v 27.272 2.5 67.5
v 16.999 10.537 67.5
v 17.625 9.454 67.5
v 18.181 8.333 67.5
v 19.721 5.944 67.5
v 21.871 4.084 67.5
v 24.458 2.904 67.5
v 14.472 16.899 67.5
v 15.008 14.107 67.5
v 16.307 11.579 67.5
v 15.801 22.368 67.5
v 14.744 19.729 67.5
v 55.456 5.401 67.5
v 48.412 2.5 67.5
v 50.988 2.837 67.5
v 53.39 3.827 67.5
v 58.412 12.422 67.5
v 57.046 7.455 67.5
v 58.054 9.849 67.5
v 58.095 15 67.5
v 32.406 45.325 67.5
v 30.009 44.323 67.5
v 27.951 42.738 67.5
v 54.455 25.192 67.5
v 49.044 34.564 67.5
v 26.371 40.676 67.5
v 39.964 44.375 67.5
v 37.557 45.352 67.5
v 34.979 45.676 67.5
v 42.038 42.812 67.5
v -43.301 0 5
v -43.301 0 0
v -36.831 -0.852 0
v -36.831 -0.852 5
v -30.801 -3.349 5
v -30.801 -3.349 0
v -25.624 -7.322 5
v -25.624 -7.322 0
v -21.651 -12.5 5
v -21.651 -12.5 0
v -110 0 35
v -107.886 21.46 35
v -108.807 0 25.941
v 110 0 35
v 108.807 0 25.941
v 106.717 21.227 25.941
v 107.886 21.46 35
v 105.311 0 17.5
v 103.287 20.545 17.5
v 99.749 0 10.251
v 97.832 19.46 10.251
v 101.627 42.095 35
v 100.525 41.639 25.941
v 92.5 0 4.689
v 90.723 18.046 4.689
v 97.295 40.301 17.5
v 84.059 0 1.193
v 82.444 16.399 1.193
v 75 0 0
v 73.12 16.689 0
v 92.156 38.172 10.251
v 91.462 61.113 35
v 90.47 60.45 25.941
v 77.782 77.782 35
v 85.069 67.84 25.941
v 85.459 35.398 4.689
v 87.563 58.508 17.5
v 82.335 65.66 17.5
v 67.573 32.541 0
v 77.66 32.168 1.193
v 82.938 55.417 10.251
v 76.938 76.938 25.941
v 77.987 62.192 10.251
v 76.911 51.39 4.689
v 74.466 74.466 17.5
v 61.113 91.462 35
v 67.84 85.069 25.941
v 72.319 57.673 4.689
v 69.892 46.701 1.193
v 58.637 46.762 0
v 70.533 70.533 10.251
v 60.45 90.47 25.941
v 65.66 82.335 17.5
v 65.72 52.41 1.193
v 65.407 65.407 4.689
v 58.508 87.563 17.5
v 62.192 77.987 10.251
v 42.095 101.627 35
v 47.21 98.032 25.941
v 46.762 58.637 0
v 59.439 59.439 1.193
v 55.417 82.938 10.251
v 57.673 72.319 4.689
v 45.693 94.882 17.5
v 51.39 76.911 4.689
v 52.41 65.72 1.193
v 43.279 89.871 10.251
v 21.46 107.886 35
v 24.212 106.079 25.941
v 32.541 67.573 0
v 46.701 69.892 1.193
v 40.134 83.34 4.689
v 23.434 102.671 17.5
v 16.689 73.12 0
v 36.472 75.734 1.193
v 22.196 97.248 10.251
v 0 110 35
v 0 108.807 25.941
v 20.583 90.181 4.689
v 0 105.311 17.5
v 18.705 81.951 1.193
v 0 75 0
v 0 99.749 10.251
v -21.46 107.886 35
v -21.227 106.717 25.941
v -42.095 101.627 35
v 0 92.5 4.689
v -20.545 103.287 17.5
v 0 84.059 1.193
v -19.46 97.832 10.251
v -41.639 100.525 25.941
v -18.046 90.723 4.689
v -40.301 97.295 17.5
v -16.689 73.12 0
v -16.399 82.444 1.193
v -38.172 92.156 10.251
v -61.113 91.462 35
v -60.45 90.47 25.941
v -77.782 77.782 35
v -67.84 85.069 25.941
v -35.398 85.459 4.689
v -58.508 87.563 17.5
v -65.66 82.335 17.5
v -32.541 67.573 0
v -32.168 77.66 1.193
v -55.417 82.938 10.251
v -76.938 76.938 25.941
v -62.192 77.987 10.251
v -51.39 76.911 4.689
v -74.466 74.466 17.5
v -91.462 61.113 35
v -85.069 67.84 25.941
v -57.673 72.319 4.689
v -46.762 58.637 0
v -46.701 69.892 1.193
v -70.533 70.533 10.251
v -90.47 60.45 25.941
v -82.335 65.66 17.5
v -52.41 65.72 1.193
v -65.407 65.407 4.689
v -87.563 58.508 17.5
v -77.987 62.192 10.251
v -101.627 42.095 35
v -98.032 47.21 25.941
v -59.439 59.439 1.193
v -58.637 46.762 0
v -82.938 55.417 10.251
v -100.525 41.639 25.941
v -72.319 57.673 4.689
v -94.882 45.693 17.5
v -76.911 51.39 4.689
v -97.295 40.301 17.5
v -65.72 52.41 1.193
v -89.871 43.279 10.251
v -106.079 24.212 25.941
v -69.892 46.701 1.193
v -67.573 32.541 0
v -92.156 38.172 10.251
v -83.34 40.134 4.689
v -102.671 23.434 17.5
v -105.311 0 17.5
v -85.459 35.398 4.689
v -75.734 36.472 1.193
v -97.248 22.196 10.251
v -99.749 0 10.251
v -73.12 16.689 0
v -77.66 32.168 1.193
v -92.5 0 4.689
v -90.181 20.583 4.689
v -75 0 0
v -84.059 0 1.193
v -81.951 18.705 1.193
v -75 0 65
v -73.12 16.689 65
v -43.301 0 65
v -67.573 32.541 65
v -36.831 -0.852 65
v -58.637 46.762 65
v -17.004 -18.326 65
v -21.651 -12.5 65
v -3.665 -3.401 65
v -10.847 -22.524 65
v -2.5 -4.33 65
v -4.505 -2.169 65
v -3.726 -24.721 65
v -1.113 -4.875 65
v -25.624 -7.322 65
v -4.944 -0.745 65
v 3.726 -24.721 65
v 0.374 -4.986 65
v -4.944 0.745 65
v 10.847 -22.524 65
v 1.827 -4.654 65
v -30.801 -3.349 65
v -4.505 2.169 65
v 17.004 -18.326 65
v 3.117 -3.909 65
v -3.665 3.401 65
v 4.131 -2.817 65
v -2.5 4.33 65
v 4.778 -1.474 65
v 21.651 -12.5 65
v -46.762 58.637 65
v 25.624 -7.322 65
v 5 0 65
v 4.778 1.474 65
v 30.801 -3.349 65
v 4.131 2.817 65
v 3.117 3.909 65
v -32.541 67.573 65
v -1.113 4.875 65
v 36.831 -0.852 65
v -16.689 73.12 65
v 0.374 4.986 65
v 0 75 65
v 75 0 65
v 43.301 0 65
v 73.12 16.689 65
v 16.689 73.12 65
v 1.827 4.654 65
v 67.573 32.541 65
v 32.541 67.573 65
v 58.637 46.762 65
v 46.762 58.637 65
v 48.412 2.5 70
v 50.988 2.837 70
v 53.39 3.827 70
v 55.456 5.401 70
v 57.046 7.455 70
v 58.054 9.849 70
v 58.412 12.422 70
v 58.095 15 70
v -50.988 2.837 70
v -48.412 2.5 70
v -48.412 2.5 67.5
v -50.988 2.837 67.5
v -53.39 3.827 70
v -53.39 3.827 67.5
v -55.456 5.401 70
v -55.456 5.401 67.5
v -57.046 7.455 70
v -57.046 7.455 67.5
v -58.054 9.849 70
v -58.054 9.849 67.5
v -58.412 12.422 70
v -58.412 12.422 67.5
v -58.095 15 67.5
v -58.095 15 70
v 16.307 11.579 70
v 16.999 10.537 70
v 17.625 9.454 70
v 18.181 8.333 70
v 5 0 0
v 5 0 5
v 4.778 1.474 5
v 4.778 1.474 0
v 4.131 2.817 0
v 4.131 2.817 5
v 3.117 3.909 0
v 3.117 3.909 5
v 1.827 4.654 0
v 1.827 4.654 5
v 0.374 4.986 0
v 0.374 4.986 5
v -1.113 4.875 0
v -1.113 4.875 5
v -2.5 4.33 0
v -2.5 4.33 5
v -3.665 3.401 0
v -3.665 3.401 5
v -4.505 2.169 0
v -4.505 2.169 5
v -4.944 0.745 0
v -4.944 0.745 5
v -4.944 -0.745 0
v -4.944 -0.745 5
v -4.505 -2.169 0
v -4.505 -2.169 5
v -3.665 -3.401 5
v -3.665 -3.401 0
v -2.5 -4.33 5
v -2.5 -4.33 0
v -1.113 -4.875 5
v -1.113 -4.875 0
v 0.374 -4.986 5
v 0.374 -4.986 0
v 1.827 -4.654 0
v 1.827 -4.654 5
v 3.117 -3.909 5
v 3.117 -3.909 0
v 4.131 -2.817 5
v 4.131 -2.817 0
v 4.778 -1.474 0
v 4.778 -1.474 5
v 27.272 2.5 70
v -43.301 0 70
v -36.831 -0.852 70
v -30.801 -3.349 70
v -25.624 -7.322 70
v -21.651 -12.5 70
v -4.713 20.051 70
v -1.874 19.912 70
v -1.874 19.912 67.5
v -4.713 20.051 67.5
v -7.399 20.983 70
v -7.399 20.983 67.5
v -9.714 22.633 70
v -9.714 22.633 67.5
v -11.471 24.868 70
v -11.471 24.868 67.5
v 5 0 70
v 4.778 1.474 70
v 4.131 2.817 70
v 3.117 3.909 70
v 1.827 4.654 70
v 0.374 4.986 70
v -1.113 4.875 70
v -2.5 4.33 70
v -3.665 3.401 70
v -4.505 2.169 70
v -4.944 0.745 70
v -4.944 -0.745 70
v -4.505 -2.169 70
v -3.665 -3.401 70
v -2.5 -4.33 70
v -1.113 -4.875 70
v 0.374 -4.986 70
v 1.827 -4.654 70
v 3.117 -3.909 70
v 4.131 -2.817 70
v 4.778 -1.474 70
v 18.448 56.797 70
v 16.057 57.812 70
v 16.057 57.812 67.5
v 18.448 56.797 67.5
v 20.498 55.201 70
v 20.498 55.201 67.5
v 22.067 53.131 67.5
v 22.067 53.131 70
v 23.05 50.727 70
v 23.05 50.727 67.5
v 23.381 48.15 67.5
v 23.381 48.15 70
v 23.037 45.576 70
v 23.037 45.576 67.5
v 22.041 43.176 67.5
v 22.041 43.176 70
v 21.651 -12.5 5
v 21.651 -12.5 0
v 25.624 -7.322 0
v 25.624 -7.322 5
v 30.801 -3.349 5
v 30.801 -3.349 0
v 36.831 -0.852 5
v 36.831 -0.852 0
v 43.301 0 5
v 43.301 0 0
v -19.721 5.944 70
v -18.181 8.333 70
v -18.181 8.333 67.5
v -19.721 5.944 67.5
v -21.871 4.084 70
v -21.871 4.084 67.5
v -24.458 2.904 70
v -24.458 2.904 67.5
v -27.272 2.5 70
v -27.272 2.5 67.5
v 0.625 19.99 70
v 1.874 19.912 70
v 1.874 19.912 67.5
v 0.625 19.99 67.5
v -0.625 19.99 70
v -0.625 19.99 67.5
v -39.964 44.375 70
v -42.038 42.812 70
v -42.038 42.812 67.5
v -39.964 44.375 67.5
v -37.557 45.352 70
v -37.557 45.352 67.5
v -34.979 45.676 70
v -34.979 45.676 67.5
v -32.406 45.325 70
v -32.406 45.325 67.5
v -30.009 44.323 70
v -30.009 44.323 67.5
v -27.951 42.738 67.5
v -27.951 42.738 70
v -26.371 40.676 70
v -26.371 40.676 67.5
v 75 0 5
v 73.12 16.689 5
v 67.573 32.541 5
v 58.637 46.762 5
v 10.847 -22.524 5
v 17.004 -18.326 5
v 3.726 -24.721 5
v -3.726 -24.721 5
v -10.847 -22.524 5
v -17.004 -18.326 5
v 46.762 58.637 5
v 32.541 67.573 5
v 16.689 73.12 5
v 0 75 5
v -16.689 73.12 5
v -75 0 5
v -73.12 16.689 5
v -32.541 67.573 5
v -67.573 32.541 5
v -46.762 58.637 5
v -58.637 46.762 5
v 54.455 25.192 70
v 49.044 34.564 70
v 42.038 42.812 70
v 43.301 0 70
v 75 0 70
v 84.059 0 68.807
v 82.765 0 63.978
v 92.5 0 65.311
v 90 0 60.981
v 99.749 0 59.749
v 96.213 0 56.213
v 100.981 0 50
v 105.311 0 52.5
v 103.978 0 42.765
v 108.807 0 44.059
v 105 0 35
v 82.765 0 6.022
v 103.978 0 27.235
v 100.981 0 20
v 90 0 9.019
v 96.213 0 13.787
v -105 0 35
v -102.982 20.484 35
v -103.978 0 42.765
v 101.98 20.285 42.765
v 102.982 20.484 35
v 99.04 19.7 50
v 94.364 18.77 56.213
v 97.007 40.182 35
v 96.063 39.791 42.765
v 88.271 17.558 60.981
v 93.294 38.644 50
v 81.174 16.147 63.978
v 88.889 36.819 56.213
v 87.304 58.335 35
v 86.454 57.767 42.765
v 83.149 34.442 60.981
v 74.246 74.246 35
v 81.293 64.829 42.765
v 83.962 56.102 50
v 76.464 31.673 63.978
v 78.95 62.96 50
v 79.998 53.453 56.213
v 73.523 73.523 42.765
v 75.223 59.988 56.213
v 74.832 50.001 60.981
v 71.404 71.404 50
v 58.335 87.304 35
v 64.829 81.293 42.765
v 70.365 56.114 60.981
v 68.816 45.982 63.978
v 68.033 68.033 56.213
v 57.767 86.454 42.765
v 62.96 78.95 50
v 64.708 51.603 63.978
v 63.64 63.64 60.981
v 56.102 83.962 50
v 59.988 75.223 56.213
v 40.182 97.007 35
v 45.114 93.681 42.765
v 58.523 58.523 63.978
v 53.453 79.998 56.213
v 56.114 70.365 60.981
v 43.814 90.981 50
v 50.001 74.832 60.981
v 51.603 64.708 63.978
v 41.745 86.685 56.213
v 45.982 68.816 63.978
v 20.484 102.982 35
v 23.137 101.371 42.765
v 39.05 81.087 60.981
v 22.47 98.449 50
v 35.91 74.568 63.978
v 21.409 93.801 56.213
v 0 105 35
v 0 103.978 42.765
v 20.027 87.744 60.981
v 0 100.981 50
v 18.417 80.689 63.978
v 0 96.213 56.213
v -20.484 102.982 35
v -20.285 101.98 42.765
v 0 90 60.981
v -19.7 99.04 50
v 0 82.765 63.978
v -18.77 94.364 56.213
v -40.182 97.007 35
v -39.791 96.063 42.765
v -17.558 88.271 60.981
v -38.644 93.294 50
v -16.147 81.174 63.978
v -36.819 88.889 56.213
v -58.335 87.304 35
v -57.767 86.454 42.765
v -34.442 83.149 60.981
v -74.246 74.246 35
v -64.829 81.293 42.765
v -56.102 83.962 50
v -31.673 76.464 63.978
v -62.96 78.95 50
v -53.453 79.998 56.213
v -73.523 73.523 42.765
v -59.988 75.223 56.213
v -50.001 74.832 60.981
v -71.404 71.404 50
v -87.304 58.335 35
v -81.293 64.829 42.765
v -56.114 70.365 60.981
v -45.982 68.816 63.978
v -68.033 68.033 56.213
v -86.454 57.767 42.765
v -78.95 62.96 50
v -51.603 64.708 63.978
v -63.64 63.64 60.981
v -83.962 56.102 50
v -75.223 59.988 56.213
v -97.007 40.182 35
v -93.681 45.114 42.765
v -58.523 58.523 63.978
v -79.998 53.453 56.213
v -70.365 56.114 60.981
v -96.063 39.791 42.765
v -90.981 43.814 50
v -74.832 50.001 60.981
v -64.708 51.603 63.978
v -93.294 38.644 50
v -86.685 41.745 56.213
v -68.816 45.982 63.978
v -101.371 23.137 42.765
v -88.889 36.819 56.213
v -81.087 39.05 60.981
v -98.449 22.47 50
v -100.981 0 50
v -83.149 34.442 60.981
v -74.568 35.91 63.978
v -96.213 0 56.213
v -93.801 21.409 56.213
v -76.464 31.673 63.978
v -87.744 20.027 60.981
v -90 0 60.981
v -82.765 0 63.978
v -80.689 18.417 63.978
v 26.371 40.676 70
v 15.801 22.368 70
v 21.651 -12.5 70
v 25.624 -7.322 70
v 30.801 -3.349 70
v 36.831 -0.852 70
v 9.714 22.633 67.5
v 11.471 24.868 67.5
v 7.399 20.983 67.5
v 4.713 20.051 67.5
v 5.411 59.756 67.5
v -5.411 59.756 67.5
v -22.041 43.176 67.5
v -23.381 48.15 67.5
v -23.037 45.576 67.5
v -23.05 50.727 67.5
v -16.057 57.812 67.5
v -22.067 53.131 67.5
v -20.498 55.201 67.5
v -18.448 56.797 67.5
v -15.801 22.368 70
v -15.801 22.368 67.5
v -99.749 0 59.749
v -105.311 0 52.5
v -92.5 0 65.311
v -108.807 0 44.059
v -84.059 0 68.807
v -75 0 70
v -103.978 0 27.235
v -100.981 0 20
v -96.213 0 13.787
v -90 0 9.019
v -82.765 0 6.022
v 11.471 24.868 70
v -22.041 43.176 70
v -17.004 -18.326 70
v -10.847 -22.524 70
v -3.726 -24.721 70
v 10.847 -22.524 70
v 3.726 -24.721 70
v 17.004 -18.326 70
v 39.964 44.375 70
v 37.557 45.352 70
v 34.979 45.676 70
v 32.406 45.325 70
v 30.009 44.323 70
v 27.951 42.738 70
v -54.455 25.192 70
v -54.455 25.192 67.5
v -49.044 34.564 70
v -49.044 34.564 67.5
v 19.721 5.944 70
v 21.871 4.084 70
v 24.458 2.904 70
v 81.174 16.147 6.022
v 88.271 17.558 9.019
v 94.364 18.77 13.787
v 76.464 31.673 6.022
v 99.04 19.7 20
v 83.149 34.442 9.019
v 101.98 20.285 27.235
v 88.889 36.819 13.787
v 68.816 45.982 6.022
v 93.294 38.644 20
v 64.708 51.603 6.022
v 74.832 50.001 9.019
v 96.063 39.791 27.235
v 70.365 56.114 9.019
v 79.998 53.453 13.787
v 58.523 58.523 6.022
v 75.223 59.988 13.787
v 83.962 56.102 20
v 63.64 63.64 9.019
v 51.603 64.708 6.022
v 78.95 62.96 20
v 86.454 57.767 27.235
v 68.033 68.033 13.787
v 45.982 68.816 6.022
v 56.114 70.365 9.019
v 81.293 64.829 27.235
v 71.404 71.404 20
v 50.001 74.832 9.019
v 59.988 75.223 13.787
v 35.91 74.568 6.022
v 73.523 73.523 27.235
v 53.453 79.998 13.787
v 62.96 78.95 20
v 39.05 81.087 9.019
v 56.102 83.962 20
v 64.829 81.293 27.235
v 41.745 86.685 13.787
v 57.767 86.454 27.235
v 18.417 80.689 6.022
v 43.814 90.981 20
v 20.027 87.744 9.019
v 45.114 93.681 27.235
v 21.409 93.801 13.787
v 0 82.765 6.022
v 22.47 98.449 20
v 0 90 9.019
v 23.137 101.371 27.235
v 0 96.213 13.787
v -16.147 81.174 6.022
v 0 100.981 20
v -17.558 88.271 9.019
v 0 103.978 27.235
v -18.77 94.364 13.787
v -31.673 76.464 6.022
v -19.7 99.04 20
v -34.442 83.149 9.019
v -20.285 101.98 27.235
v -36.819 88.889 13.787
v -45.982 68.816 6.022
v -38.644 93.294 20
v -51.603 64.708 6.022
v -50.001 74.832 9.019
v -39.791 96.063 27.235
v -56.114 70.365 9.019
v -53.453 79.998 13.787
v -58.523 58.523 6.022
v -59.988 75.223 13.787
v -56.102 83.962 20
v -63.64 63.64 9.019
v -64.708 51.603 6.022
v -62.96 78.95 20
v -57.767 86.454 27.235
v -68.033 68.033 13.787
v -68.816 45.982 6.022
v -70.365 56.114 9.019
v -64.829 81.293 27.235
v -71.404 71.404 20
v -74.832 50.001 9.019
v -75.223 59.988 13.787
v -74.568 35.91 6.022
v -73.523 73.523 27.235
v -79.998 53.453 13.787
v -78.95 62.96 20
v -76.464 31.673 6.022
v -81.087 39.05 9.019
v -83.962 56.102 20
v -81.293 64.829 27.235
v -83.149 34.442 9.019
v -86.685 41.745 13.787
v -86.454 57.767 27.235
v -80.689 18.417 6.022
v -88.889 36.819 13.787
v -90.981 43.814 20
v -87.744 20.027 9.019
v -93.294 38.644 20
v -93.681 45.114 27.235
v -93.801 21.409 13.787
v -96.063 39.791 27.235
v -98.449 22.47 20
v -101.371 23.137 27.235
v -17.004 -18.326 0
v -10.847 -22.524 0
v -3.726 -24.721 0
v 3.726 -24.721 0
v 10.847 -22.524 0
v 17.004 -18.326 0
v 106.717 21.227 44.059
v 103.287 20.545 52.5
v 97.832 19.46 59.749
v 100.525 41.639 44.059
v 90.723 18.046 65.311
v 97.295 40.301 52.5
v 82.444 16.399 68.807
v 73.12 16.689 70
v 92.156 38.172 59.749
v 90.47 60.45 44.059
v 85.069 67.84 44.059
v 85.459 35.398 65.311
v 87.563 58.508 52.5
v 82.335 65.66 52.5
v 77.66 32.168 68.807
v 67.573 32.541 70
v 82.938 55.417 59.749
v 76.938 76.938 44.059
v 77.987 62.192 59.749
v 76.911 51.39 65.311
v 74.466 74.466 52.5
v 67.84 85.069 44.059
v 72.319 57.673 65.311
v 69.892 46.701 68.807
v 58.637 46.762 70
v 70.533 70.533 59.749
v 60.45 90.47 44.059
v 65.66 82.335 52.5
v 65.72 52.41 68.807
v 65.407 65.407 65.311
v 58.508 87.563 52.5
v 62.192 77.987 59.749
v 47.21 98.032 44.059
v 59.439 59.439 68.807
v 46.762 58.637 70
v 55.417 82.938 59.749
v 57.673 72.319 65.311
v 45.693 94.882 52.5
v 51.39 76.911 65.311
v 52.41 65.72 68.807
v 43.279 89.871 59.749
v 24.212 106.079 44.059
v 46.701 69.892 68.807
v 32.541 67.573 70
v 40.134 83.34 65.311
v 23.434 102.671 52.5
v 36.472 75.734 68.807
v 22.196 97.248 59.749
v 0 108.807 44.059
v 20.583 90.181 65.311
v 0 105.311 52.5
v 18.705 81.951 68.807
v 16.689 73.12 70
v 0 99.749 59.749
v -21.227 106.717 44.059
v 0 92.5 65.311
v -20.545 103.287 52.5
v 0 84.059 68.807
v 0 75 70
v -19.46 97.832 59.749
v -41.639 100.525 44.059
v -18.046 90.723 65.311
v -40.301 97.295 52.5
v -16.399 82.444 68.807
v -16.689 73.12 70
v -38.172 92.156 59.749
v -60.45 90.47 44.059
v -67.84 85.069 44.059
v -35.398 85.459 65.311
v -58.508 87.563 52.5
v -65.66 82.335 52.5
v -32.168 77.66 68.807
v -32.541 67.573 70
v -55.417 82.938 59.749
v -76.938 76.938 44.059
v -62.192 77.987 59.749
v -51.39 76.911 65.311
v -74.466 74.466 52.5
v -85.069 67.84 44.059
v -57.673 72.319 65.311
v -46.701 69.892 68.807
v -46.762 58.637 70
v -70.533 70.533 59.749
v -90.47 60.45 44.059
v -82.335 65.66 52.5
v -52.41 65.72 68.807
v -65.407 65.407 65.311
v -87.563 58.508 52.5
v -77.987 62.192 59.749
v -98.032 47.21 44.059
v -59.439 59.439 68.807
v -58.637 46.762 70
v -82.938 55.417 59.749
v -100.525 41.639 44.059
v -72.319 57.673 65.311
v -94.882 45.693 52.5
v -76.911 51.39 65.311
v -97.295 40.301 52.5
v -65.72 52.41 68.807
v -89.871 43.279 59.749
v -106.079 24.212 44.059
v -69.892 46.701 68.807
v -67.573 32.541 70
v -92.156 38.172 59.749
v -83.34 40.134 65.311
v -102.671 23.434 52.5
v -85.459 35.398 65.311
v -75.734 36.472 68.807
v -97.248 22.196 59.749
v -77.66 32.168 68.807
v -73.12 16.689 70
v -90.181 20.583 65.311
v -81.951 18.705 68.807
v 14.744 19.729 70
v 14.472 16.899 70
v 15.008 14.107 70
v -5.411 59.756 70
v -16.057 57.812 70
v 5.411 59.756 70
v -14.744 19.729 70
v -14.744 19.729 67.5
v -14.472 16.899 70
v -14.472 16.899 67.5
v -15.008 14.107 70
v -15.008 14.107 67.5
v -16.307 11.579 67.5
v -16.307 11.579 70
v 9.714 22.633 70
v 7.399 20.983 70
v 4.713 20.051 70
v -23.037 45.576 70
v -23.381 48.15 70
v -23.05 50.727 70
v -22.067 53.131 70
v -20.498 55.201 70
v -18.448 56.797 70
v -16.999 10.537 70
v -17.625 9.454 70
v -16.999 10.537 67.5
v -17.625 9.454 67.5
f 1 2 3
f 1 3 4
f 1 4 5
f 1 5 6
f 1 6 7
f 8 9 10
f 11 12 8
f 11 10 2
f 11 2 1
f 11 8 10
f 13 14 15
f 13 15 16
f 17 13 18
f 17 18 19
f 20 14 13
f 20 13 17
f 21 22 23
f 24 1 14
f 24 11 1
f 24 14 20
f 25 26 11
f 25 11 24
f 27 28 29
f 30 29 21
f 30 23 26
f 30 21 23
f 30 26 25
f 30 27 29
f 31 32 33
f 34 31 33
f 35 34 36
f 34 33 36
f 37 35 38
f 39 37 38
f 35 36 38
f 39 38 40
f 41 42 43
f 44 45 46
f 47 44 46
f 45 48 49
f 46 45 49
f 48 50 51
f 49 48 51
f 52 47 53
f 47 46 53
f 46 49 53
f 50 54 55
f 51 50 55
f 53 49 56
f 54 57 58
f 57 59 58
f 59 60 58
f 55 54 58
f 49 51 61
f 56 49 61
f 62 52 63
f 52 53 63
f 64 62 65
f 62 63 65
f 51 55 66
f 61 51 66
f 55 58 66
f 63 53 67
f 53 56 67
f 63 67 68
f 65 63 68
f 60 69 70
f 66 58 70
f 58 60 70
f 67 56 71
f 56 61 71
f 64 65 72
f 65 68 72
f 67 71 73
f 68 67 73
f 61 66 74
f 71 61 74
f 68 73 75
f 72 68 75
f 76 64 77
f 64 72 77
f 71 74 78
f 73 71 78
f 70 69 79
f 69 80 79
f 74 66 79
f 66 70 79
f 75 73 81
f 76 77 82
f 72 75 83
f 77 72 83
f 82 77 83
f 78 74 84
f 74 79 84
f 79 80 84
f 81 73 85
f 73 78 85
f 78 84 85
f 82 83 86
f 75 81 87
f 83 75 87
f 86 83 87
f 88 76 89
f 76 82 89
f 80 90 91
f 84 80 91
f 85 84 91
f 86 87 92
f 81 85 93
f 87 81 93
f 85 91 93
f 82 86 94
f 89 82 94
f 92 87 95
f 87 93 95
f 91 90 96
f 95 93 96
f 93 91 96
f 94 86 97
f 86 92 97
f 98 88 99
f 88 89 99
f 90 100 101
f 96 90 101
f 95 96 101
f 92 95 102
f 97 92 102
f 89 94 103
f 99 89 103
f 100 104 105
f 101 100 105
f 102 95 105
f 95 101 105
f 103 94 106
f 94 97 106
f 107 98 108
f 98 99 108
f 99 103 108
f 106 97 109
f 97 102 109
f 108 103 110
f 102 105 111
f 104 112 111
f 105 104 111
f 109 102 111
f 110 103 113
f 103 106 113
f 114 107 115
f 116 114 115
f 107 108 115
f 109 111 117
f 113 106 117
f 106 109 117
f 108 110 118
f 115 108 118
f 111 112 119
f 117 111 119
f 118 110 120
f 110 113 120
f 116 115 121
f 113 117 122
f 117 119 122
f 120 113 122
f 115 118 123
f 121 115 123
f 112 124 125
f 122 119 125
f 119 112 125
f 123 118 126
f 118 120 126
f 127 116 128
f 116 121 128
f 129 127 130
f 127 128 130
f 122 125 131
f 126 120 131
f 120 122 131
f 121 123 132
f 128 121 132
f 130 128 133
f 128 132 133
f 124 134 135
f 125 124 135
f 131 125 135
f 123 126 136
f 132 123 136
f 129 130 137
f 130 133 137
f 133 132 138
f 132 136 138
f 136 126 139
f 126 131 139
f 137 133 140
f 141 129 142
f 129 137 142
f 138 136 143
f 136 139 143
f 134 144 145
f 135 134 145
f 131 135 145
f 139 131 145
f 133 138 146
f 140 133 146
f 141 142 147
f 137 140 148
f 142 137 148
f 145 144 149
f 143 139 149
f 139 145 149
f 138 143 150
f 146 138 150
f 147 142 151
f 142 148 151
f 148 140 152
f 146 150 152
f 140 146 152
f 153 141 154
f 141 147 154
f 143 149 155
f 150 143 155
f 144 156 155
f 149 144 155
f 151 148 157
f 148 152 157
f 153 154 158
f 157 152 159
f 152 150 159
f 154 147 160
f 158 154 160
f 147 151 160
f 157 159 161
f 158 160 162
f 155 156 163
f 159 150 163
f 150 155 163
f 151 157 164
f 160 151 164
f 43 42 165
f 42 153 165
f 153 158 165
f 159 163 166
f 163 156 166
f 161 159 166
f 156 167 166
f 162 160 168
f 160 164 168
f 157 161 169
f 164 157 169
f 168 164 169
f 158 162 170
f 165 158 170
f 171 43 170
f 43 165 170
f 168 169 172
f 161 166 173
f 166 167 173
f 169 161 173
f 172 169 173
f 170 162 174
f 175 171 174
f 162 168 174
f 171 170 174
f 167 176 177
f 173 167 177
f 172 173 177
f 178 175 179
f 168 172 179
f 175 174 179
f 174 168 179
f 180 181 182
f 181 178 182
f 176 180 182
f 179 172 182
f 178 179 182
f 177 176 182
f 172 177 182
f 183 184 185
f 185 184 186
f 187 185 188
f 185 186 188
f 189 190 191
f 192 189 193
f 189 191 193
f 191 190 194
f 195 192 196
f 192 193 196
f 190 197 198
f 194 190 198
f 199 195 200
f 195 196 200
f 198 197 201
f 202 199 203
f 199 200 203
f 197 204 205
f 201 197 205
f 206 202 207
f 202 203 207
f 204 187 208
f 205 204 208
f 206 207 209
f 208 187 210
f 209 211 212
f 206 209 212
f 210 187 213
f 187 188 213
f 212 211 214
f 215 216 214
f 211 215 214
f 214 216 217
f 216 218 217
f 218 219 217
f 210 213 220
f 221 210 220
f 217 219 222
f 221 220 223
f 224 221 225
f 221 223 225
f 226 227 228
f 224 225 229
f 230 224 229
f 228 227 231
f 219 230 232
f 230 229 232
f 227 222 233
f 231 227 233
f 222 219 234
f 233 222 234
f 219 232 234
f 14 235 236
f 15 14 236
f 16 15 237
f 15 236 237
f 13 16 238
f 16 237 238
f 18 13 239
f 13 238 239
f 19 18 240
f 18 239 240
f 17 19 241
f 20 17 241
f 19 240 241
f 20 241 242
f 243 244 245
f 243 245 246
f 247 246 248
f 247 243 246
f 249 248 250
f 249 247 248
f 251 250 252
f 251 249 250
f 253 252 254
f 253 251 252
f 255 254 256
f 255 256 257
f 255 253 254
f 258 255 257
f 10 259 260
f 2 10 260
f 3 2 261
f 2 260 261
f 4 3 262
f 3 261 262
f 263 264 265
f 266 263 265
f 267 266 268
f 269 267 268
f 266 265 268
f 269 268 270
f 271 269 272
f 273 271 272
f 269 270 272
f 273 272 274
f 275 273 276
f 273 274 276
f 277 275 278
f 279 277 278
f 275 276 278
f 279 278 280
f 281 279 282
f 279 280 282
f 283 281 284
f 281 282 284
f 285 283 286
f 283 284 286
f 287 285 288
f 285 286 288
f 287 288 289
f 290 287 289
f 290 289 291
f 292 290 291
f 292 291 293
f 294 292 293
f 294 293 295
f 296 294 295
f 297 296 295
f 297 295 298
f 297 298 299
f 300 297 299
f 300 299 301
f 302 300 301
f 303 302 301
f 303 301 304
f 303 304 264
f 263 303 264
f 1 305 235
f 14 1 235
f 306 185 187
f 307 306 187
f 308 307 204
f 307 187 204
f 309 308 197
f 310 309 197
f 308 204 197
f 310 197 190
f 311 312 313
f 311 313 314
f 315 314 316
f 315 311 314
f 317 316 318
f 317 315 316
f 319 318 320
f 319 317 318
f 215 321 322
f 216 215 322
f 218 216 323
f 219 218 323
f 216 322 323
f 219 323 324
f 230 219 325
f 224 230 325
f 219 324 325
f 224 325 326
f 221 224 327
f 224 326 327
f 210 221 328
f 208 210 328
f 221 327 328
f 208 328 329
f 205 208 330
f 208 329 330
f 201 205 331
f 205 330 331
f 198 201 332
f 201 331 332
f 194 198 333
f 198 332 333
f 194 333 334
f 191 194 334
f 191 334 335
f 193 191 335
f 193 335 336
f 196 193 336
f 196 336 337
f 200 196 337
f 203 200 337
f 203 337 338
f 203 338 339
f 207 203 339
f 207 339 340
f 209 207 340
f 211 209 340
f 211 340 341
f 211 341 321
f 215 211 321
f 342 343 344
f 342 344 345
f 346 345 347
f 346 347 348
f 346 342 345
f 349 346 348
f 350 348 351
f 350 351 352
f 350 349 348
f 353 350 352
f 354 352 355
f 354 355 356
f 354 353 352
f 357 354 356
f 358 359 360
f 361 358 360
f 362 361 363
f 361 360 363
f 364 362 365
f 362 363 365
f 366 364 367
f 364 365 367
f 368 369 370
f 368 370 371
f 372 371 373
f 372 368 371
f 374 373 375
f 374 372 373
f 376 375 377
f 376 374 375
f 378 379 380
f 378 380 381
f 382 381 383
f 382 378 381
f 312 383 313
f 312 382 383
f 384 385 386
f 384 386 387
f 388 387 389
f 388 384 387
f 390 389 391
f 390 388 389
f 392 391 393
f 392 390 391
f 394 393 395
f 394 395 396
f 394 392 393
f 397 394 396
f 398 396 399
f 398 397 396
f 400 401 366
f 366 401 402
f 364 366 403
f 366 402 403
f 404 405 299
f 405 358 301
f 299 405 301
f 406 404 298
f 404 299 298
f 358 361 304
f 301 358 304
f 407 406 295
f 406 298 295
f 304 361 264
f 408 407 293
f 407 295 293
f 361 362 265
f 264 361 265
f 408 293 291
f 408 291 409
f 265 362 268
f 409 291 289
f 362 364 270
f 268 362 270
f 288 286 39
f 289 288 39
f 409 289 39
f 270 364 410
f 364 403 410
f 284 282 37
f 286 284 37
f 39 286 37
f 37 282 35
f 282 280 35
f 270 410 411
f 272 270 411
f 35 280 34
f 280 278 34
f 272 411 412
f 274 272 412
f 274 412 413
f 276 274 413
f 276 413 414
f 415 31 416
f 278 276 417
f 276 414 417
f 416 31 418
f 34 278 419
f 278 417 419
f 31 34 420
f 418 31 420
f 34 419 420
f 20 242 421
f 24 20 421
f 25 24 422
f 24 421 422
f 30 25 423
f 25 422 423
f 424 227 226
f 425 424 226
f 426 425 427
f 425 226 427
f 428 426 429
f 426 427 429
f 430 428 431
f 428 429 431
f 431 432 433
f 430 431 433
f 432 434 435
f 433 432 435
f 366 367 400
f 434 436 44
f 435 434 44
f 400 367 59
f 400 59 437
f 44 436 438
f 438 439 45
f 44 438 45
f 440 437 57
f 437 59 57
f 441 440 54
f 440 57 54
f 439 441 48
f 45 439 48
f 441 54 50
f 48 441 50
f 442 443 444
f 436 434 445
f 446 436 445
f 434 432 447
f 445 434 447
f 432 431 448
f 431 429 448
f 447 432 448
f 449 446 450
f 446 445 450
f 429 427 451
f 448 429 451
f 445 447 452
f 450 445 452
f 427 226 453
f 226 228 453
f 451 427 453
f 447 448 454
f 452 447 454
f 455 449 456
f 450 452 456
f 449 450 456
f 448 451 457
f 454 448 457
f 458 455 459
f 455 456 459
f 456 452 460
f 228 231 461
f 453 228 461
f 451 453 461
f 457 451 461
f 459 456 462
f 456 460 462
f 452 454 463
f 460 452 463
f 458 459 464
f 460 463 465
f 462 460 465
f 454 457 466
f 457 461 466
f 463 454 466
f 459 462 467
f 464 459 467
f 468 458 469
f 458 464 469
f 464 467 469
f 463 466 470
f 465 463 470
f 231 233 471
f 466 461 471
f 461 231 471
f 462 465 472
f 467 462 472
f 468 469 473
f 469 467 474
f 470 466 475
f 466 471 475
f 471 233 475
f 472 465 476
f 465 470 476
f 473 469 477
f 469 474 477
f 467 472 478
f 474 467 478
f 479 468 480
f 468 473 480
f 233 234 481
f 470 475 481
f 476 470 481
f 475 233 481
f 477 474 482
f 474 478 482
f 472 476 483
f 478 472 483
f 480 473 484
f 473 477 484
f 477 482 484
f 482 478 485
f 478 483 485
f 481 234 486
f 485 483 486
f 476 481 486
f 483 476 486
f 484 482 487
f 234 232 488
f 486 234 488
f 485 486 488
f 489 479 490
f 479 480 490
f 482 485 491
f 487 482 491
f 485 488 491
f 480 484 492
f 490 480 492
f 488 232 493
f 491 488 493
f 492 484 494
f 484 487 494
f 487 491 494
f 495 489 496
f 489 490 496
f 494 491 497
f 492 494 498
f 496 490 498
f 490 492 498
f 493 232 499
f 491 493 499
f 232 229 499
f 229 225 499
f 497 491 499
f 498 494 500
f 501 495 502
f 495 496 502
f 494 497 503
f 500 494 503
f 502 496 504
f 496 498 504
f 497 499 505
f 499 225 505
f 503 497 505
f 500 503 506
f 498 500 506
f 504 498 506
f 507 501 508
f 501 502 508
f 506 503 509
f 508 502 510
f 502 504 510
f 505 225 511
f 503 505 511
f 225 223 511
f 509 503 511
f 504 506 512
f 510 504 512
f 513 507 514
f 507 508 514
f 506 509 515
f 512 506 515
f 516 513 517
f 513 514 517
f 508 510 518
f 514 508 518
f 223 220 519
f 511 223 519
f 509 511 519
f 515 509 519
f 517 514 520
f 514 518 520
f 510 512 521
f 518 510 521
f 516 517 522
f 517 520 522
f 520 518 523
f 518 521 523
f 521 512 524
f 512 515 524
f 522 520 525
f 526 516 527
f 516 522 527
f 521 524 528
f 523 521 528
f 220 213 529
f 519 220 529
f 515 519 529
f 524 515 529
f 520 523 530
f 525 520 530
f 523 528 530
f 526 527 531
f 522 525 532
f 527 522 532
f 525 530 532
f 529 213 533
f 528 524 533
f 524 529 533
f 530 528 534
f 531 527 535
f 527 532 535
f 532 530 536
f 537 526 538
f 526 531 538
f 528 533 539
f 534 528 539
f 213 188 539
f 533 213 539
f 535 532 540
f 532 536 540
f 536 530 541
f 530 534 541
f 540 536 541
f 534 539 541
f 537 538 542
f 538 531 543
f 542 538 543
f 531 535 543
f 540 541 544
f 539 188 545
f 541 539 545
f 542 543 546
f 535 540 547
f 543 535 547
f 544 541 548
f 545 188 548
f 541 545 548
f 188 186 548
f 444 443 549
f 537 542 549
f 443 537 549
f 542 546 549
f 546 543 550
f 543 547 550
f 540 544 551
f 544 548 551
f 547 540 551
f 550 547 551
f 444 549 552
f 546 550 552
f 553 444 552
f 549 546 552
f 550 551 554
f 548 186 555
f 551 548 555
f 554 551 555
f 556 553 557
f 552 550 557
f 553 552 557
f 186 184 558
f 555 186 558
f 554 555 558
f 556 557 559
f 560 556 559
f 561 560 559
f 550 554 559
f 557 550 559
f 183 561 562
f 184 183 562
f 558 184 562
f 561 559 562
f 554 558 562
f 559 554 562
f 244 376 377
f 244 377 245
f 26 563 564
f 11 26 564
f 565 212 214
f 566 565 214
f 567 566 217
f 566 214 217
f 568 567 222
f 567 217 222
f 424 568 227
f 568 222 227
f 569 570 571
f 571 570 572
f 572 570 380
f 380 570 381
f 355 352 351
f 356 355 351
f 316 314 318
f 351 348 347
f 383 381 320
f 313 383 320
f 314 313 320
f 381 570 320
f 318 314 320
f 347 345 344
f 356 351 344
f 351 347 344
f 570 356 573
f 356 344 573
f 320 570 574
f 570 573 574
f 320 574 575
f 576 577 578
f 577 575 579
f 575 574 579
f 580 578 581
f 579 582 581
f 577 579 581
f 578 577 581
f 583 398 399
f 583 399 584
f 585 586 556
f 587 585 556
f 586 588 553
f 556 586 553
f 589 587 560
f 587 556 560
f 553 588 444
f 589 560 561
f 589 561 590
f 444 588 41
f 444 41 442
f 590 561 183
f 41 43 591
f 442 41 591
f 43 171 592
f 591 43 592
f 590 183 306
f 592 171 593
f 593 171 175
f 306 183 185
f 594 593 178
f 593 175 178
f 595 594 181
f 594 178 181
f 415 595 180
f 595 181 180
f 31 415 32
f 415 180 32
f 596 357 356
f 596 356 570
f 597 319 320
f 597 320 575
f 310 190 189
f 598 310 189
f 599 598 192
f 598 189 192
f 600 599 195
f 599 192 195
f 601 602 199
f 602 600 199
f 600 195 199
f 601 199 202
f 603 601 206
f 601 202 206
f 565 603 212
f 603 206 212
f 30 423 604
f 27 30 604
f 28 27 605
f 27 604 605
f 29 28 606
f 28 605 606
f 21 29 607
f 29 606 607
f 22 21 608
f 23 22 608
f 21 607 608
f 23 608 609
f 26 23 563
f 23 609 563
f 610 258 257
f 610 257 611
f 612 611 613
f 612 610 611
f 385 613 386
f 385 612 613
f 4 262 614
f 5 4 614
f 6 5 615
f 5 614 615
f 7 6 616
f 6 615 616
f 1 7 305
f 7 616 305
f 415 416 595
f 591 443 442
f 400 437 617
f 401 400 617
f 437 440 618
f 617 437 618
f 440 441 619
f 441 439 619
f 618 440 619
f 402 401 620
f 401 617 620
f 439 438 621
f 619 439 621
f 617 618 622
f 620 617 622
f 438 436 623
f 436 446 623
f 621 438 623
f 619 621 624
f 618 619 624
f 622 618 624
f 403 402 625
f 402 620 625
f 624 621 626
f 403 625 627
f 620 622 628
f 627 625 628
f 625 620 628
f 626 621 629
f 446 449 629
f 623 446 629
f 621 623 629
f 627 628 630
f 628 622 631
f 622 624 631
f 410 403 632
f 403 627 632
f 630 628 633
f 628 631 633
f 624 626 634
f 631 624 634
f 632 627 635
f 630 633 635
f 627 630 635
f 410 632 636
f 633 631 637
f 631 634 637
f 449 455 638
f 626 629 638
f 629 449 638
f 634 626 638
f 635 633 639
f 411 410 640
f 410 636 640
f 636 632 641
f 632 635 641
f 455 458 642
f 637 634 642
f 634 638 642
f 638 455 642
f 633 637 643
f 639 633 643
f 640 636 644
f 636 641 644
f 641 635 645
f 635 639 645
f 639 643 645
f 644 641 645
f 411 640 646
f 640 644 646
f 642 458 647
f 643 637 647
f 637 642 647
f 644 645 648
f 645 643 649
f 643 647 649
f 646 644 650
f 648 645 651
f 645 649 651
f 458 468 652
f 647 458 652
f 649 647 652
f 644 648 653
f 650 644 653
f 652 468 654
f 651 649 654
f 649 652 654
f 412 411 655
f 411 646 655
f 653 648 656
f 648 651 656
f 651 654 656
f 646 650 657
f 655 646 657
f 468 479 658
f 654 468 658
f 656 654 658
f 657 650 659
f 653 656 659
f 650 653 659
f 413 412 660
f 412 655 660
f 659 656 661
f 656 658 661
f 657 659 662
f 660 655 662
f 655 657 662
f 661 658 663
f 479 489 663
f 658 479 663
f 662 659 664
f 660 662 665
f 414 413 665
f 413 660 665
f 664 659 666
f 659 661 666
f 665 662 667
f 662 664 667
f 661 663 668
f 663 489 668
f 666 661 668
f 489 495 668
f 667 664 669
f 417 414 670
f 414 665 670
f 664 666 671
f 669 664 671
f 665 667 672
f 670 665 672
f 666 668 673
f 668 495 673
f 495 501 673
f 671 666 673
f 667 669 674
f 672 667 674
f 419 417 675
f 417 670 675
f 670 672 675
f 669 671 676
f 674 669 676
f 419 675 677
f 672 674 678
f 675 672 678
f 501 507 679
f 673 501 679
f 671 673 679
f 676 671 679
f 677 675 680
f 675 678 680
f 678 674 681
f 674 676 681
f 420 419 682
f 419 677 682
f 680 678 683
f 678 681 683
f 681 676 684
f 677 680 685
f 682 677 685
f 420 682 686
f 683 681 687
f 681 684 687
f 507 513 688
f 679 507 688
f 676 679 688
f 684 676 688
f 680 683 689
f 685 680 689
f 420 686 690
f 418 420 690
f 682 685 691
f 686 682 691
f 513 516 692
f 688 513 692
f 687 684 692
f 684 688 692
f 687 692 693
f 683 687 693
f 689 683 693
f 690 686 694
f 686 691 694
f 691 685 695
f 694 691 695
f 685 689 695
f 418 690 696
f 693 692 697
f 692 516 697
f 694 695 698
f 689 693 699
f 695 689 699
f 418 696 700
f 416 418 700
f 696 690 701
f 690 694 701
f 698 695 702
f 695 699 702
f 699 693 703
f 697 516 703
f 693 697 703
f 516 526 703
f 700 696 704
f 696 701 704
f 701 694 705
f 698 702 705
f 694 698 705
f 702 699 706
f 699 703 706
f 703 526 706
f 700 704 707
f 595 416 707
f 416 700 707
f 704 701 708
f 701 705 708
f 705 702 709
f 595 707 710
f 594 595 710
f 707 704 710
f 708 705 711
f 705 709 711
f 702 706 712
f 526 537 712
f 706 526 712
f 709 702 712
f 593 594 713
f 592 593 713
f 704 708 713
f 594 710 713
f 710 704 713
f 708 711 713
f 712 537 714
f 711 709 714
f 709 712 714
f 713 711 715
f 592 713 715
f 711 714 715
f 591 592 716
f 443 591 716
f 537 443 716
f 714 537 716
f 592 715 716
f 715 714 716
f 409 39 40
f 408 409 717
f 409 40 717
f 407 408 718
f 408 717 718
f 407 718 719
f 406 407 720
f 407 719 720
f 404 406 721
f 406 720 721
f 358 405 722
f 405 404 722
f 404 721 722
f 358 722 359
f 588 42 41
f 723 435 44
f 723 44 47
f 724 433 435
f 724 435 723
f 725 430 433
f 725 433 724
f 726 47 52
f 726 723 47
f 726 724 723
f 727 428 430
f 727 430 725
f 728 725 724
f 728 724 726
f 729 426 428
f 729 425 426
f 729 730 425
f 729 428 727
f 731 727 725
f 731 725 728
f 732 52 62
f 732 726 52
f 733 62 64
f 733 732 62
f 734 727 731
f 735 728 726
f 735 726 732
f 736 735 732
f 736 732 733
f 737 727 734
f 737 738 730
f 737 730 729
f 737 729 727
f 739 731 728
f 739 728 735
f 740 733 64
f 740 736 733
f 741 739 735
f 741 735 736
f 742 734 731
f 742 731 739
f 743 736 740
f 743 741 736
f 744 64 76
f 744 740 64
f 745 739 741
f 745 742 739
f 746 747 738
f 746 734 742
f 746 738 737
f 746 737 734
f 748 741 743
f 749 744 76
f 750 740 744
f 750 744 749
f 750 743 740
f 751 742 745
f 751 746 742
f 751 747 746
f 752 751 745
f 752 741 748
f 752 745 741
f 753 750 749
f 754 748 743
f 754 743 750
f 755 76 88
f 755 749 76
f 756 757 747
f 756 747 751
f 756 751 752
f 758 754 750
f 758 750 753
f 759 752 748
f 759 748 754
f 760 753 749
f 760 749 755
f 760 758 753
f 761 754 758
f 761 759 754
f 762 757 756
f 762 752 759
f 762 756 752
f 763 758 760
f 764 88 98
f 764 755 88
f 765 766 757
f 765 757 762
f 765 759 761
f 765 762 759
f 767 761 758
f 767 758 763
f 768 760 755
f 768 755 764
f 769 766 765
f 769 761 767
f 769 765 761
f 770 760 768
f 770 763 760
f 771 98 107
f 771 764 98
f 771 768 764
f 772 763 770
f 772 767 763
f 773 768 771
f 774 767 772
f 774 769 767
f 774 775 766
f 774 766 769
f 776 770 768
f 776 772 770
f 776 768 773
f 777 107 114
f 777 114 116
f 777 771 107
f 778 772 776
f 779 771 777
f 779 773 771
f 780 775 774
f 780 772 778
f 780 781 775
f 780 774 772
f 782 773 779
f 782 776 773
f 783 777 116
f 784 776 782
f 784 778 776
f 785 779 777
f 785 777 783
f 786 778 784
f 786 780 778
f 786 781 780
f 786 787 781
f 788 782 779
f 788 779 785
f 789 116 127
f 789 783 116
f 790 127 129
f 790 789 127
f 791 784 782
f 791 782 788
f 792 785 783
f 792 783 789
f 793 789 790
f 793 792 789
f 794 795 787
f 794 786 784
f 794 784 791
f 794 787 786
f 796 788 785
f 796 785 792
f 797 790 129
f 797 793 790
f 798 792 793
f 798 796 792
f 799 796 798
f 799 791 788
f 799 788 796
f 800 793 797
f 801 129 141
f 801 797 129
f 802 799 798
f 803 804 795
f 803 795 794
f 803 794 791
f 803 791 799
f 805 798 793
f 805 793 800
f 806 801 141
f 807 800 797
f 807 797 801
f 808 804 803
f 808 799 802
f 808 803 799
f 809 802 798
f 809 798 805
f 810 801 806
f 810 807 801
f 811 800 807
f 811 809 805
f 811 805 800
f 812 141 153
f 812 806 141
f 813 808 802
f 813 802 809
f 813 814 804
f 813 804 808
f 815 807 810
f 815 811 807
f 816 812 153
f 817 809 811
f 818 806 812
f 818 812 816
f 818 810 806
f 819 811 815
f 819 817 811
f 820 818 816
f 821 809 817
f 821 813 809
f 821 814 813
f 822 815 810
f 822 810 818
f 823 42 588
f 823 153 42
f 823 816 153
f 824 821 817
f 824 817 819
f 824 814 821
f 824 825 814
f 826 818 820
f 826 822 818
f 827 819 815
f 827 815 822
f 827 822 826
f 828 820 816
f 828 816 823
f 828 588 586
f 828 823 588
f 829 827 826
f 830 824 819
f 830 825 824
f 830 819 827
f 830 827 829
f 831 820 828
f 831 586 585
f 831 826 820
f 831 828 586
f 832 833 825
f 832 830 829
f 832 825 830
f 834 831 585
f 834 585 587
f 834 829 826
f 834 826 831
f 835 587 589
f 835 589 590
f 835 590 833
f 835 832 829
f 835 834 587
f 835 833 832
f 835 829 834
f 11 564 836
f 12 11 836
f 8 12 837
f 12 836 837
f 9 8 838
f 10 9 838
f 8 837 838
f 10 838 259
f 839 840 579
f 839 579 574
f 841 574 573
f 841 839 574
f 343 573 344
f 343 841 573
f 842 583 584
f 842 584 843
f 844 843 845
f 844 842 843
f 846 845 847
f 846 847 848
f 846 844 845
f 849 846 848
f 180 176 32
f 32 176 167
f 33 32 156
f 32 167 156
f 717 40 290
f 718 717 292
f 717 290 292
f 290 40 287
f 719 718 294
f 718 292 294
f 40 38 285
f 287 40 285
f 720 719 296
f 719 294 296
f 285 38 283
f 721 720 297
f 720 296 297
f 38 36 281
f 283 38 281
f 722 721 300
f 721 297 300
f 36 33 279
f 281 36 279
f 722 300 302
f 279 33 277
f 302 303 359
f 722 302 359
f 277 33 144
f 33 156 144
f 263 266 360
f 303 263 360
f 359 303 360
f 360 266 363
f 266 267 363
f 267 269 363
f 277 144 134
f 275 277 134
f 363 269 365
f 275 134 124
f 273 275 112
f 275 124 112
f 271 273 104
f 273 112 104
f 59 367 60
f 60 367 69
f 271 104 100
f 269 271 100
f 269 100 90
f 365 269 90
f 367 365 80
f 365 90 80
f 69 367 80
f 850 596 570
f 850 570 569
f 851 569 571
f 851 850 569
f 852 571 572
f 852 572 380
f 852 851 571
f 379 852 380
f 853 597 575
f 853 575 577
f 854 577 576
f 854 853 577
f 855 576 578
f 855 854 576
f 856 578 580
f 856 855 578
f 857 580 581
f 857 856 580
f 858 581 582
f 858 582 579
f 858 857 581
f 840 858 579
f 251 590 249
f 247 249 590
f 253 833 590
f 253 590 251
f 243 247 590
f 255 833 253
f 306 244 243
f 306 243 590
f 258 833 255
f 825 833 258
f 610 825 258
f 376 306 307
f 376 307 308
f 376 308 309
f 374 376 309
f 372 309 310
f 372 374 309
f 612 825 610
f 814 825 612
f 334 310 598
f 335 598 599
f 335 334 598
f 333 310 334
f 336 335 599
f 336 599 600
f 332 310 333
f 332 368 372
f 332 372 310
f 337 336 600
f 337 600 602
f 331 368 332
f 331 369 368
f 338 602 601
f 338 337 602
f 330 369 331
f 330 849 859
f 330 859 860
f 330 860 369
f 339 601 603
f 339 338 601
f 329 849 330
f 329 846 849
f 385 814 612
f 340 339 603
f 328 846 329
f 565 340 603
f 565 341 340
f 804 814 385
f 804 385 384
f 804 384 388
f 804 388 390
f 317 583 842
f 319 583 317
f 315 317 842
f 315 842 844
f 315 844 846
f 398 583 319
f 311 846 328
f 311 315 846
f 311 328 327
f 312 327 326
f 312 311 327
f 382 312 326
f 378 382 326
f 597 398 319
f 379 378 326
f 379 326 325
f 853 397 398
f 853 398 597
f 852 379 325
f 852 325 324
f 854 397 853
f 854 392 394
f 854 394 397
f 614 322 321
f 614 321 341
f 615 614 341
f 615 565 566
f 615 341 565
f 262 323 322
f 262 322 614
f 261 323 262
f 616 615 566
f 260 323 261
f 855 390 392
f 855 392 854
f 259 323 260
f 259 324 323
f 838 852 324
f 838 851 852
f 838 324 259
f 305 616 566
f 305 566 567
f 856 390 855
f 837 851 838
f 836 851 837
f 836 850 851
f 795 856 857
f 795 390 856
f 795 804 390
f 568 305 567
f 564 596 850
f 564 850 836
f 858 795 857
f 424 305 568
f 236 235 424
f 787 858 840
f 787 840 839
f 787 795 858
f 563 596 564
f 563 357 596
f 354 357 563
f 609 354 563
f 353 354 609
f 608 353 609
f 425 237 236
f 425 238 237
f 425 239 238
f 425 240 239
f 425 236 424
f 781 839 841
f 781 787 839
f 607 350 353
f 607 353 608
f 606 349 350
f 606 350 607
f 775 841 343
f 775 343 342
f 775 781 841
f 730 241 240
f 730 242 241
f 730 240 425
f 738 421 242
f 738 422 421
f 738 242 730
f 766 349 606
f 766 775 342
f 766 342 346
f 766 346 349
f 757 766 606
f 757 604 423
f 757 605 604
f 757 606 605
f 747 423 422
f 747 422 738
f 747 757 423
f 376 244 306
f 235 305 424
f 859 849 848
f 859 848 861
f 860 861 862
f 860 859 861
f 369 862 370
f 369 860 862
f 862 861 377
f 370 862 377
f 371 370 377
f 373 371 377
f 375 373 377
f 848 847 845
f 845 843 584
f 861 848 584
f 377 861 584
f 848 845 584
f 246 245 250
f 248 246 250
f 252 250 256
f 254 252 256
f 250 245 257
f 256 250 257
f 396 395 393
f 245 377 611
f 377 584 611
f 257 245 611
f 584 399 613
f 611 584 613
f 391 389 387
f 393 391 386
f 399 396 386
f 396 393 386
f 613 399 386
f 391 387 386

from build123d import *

# Parameters (mm, degrees)
SKETCH1_R      = 110
EXTRUDE1_DEPTH = 70
FILLET1_R      = 35
EXTRUDE2_DEPTH = 171.587221092
SKETCH3_R      = 5
EXTRUDE3_DEPTH = 171.587221262
EXTRUDE7_DEPTH = 2.5


# Read off the part's stored shape, not the designer's step: Shell1
with BuildPart() as part:
    # Sketch1 → Extrude1 (new body)
    with BuildSketch(Plane.XY):
        Circle(SKETCH1_R)
    extrude(amount=EXTRUDE1_DEPTH)

    # Fillet1
    fillet1_edges = [part.edges().sort_by_distance(p)[0] for p in [
        (-110, 0, 0),
        (-110, 0, 70),
    ]]
    fillet(fillet1_edges, radius=FILLET1_R - 0.0001)  # a hair under: the kernel refuses the full size

    # Sketch2 → Extrude2 (cut, through all)
    with BuildSketch(Plane.XY):
        with BuildLine():
            Line((43.301270189, 0), (110, 0))
            Line((110, 0), (110, -110))
            Line((110, -110), (-110, -110))
            Line((-110, -110), (-110, 0))
            Line((-110, 0), (-43.301270189, 0))
            ThreePointArc((-43.301270189, 0), (-30.801270189, -3.349364905), (-21.650635095, -12.5))
            ThreePointArc((-21.650635095, -12.5), (0, -25), (21.650635095, -12.5))
            ThreePointArc((21.650635095, -12.5), (30.801270189, -3.349364905), (43.301270189, 0))
        make_face()
    extrude(amount=EXTRUDE2_DEPTH, mode=Mode.SUBTRACT)

    # Shell1 outline → Shell1 (revolve, cut)
    with BuildSketch(Plane.XZ):
        with BuildLine():
            Line((0, 65), (0, 5))
            Line((0, 5), (75, 5))
            ThreePointArc((75, 5), (96.213203436, 13.786796564), (105, 35))
            ThreePointArc((105, 35), (96.213203436, 56.213203436), (75, 65))
            Line((75, 65), (0, 65))
        make_face()
    revolve(axis=Axis((0, 0, 0), (0, 0, 1)), mode=Mode.SUBTRACT)

    # Sketch3 → Extrude3 (cut, through all)
    with BuildSketch(Plane.XY.offset(70)):
        Circle(SKETCH3_R)
    extrude(amount=-EXTRUDE3_DEPTH, mode=Mode.SUBTRACT)

    # Sketch5 → Extrude7 (cut)
    with BuildSketch(Plane.XY.offset(70)):
        with BuildLine():
            Line((-27.271780287, 2.5), (-48.412291828, 2.5))
            ThreePointArc((-48.412291828, 2.5), (-56.317985978, 6.376275643), (-58.094750193, 15))
            ThreePointArc((-58.094750193, 15), (-51.961524227, 30), (-42.037756153, 42.811529494))
            ThreePointArc((-42.037756153, 42.811529494), (-33.681009677, 45.584668725), (-26.371209423, 40.676274578))
            Line((-26.371209423, 40.676274578), (-15.800953653, 22.368054535))
            ThreePointArc((-15.800953653, 22.368054535), (-14.472209198, 16.899109859), (-16.307471794, 11.578703023))
            ThreePointArc((-16.307471794, 11.578703023), (-17.320508076, 10), (-18.181186858, 8.333333333))
            ThreePointArc((-18.181186858, 8.333333333), (-21.871163038, 4.083745885), (-27.271780287, 2.5))
        make_face()
        with BuildLine():
            Line((-11.470826634, 24.868054535), (-22.041082404, 43.176274578))
            ThreePointArc((-22.041082404, 43.176274578), (-22.636976301, 51.960944368), (-16.05699404, 57.811529494))
            ThreePointArc((-16.05699404, 57.811529494), (0, 60), (16.05699404, 57.811529494))
            ThreePointArc((16.05699404, 57.811529494), (22.636976301, 51.960944368), (22.041082404, 43.176274578))
            Line((22.041082404, 43.176274578), (11.470826634, 24.868054535))
            ThreePointArc((11.470826634, 24.868054535), (7.39895384, 20.982855743), (1.873715064, 19.912036356))
            ThreePointArc((1.873715064, 19.912036356), (0, 20), (-1.873715064, 19.912036356))
            ThreePointArc((-1.873715064, 19.912036356), (-7.39895384, 20.982855743), (-11.470826634, 24.868054535))
        make_face()
        with BuildLine():
            Line((27.271780287, 2.5), (48.412291828, 2.5))
            ThreePointArc((48.412291828, 2.5), (56.317985978, 6.376275643), (58.094750193, 15))
            ThreePointArc((58.094750193, 15), (51.961524227, 30), (42.037756153, 42.811529494))
            ThreePointArc((42.037756153, 42.811529494), (33.681009677, 45.584668725), (26.371209423, 40.676274578))
            Line((26.371209423, 40.676274578), (15.800953653, 22.368054535))
            ThreePointArc((15.800953653, 22.368054535), (14.472209198, 16.899109859), (16.307471794, 11.578703023))
            ThreePointArc((16.307471794, 11.578703023), (17.320508076, 10), (18.181186858, 8.333333333))
            ThreePointArc((18.181186858, 8.333333333), (21.871163038, 4.083745885), (27.271780287, 2.5))
        make_face()
    extrude(amount=-EXTRUDE7_DEPTH, mode=Mode.SUBTRACT)


solid = part.part
